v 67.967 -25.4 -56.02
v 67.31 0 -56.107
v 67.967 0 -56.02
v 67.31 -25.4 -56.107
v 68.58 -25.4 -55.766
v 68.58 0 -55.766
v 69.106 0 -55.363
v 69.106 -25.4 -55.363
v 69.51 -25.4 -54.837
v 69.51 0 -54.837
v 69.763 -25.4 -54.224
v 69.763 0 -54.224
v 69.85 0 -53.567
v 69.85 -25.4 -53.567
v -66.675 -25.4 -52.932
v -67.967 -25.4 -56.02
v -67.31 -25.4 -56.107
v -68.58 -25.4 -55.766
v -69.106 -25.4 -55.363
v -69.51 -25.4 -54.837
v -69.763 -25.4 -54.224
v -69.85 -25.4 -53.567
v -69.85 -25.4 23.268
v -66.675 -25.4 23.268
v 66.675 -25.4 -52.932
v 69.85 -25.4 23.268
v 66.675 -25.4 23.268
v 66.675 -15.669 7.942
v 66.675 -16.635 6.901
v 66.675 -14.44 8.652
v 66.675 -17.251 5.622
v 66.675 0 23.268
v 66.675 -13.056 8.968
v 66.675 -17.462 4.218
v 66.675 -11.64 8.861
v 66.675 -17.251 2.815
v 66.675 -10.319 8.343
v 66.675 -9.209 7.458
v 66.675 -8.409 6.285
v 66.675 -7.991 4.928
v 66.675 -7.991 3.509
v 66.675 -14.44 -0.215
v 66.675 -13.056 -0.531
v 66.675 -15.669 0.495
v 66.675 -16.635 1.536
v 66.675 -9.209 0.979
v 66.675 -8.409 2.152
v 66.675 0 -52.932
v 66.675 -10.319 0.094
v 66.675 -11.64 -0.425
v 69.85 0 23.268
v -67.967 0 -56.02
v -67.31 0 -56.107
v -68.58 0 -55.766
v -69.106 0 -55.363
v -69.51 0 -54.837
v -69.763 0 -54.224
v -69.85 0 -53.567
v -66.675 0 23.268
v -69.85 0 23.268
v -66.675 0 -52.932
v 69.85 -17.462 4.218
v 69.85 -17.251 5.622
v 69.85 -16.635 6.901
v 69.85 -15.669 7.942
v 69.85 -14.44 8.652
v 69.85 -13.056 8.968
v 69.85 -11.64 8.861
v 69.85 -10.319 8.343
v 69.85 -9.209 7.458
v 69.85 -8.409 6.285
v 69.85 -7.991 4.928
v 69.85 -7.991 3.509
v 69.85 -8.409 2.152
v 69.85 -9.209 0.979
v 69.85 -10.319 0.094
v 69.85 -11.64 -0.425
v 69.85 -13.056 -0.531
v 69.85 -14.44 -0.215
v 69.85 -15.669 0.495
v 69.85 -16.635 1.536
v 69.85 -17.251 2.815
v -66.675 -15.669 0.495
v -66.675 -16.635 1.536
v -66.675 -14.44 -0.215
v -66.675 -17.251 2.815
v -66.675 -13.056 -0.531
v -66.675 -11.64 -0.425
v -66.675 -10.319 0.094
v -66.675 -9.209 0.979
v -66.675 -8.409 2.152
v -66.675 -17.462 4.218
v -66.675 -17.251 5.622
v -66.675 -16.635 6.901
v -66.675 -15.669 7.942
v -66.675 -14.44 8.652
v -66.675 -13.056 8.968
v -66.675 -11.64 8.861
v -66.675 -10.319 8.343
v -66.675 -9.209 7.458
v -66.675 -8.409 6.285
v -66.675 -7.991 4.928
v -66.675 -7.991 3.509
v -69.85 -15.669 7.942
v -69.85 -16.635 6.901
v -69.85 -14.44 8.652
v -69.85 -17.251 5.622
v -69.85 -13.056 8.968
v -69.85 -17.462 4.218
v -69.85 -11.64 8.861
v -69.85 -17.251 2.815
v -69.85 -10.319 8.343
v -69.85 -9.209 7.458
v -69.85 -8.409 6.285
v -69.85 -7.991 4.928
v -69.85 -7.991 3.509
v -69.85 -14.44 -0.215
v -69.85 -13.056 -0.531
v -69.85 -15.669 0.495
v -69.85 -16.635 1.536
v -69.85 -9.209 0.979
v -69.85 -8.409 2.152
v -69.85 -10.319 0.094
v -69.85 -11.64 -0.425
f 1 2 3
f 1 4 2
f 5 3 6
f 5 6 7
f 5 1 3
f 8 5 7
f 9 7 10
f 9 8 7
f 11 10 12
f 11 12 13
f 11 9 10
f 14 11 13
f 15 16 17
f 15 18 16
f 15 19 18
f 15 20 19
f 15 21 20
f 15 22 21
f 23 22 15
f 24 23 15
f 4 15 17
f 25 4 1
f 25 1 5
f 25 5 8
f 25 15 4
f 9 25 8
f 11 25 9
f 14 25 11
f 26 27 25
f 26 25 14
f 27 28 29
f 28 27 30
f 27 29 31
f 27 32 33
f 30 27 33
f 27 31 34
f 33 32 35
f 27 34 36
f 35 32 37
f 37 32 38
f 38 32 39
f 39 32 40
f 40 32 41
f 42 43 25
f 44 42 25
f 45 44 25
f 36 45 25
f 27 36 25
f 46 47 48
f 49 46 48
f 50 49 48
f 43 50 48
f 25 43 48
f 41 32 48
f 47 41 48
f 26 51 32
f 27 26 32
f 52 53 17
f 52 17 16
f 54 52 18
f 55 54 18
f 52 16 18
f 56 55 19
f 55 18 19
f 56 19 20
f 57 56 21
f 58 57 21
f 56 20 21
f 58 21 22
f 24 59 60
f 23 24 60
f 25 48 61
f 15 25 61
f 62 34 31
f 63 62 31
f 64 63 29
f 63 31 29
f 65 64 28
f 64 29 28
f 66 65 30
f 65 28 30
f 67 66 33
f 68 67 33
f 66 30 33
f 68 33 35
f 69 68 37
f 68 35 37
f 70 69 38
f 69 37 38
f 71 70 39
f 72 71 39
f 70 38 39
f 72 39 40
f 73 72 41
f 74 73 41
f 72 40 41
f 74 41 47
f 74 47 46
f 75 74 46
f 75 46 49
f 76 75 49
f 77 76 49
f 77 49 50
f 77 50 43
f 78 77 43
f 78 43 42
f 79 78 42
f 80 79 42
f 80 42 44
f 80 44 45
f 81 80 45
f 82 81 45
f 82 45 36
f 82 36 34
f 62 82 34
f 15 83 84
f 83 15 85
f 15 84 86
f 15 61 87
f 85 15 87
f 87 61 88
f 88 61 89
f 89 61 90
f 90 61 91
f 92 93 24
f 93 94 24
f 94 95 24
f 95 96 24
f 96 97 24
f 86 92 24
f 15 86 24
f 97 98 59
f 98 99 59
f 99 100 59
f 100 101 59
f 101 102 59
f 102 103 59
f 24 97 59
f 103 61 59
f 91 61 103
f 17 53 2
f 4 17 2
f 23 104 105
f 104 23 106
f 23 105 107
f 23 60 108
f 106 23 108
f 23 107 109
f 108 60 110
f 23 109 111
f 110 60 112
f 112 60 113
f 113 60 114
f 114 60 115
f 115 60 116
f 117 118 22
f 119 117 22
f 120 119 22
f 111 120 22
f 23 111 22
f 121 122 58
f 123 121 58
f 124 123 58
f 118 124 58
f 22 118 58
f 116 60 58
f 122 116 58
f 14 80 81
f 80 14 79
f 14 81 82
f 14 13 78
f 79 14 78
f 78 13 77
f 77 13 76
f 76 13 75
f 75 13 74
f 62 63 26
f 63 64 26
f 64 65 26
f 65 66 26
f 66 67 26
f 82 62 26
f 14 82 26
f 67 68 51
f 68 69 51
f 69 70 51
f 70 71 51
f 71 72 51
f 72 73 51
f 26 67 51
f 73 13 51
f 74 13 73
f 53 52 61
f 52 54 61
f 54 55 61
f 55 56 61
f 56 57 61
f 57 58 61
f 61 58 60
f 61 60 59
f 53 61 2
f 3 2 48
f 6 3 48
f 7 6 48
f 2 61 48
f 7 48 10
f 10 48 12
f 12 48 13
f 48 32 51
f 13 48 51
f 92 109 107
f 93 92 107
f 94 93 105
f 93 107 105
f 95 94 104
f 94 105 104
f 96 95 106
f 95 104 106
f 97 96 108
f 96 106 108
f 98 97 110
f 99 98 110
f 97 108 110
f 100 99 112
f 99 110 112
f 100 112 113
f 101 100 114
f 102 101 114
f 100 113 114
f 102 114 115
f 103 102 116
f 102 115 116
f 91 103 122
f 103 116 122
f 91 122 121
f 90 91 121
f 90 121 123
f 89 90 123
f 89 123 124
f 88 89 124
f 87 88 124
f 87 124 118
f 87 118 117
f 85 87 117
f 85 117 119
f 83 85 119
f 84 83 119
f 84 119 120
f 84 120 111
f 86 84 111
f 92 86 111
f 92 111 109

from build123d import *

# Parameters (mm, degrees)
F1_DEPTH = 25.4
F2_R     = 2.54
F3_R     = 4.7625
F4_DEPTH = 152.4


with BuildPart() as f1:
    # F0 (on Front) → F1 (new body)
    with BuildSketch(Plane.XZ):
        Polygon((-69.85, -56.106601), (0, -56.106601), (69.85, -56.106601), (69.85, -52.931601), (69.85, 23.268399), (66.675, 23.268399), (66.675, -52.931601), (-66.675, -52.931601), (-66.675, 23.268399), (-69.85, 23.268399), (-69.85, -52.931601), align=None)
    extrude(amount=F1_DEPTH)

    # F2
    f2_edges = [f1.edges().sort_by_distance(p)[0] for p in [
        (-69.85, -12.7, -56.106601),
        (69.85, -12.7, -56.106601),
    ]]
    fillet(f2_edges, radius=F2_R)

    # F3 (on face) → F4 (cut)
    with BuildSketch(Plane(origin=(-69.85, 0, 0), x_dir=(0, -1, 0), z_dir=(-1, 0, 0))):
        with Locations((12.7, 4.218399)):
            Circle(F3_R)
    extrude(amount=-F4_DEPTH, mode=Mode.SUBTRACT)


solid = f1.part
